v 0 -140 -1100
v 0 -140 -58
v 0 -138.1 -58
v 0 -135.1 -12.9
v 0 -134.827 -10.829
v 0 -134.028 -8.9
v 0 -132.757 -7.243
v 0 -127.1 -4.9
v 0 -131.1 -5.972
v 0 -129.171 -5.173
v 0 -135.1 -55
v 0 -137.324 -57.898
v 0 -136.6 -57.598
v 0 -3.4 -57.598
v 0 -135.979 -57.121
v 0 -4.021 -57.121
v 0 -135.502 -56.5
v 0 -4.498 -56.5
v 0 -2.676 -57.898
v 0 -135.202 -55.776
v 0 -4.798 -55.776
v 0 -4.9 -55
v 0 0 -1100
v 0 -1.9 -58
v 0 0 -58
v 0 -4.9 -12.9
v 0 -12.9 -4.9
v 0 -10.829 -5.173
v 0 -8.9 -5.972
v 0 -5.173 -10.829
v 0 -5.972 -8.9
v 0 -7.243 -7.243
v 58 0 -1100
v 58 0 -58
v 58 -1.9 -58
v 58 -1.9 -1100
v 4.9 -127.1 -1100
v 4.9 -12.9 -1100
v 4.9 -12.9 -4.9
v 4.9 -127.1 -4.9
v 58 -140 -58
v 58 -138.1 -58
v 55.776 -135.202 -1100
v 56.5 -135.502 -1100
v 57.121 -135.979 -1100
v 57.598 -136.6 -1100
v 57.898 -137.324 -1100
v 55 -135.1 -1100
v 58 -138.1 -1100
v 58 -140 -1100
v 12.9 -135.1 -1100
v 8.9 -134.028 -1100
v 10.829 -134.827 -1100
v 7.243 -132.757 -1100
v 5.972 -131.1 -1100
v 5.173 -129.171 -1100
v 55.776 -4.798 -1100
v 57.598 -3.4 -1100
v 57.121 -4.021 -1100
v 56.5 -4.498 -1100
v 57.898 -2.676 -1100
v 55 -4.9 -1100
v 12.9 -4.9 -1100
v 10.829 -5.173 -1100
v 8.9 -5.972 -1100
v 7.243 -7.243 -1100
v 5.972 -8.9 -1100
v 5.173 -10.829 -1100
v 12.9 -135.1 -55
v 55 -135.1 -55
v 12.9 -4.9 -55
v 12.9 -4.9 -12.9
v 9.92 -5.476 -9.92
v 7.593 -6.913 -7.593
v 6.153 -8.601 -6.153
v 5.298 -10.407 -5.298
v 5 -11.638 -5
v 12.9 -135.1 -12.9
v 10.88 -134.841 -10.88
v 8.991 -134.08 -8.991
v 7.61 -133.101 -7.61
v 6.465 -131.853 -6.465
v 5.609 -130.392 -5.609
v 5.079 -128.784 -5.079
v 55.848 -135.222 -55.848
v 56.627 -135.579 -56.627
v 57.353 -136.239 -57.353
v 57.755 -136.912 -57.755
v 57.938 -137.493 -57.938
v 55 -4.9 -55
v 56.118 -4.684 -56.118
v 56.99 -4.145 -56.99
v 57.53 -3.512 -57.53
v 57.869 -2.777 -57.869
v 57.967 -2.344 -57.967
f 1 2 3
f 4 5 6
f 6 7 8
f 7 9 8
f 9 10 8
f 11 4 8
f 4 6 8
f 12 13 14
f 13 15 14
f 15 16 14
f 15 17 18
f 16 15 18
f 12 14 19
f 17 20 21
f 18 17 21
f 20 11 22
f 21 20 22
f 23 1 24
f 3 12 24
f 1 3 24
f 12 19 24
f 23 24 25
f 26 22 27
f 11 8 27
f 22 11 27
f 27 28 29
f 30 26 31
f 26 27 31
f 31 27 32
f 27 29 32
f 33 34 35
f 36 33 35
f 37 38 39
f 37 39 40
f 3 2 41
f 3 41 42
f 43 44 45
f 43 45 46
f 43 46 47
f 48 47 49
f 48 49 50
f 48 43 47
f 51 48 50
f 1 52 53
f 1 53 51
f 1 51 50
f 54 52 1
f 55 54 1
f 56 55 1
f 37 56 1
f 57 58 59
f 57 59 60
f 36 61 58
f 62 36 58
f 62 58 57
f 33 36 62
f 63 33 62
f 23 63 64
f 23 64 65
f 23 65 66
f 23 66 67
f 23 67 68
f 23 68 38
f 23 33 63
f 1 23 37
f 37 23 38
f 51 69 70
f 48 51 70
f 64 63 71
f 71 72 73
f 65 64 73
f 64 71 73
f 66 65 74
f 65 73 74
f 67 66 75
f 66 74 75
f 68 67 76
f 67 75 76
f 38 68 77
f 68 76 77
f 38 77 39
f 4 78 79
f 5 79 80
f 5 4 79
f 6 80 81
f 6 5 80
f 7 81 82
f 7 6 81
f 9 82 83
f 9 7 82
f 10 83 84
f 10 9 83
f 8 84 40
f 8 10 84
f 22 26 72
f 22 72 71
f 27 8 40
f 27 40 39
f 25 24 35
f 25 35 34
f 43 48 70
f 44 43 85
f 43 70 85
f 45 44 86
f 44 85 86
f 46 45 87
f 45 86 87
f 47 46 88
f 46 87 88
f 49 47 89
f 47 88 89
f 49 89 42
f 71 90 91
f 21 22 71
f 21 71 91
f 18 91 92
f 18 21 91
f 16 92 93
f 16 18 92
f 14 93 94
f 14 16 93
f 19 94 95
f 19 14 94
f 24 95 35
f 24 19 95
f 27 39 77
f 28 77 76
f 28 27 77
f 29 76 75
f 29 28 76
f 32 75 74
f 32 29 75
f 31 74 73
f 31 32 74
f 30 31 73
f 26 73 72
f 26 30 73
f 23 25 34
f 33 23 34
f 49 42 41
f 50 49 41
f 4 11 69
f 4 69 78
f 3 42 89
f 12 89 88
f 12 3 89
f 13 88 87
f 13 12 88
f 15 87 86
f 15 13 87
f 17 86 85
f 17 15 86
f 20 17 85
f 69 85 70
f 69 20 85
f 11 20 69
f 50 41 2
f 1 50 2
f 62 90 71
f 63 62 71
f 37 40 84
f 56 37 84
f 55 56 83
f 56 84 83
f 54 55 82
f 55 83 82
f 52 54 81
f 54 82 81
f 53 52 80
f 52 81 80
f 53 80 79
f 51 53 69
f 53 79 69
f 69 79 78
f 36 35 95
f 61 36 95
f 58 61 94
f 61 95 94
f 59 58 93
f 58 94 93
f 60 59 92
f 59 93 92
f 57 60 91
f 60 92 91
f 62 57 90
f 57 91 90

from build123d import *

# Parameters (mm, degrees)
EXTRUDE_1_DEPTH = 1100
OTHER_1_DEPTH   = 58


# Read off the part's stored shape, not the designer's step: Полость1
with BuildPart() as part:
    # Эскиз1 → Бобышка-Вытянуть1 (new body)
    with BuildSketch(Plane.XY):
        with BuildLine():
            Line((0, -140), (0, 0))
            Line((0, 0), (58, 0))
            Line((58, 0), (58, -1.9))
            ThreePointArc((58, -1.9), (57.121320344, -4.021320344), (55, -4.9))
            Line((55, -4.9), (12.9, -4.9))
            ThreePointArc((12.9, -4.9), (7.243145751, -7.243145751), (4.9, -12.9))
            Line((4.9, -12.9), (4.9, -127.1))
            ThreePointArc((4.9, -127.1), (7.243145751, -132.756854249), (12.9, -135.1))
            Line((12.9, -135.1), (55, -135.1))
            ThreePointArc((55, -135.1), (57.121320344, -135.978679656), (58, -138.1))
            Line((58, -138.1), (58, -140))
            Line((58, -140), (0, -140))
        make_face()
    extrude(amount=-EXTRUDE_1_DEPTH)

    # Полость1 outline → Полость1 (cut)
    with BuildSketch(Plane.YZ):
        with BuildLine():
            Line((-140, 0), (-140, -58))
            Line((-140, -58), (-138.1, -58))
            ThreePointArc((-138.1, -58), (-135.978679656, -57.121320344), (-135.1, -55))
            Line((-135.1, -55), (-135.1, -12.9))
            ThreePointArc((-135.1, -12.9), (-132.756854249, -7.243145751), (-127.1, -4.9))
            Line((-127.1, -4.9), (-12.9, -4.9))
            ThreePointArc((-12.9, -4.9), (-7.243145751, -7.243145751), (-4.9, -12.9))
            Line((-4.9, -12.9), (-4.9, -55))
            ThreePointArc((-4.9, -55), (-4.021320344, -57.121320344), (-1.9, -58))
            Line((-1.9, -58), (0, -58))
            Line((0, -58), (0, 0))
            Line((0, 0), (-140, 0))
        make_face()
    extrude(amount=OTHER_1_DEPTH, mode=Mode.SUBTRACT)


solid = part.part
